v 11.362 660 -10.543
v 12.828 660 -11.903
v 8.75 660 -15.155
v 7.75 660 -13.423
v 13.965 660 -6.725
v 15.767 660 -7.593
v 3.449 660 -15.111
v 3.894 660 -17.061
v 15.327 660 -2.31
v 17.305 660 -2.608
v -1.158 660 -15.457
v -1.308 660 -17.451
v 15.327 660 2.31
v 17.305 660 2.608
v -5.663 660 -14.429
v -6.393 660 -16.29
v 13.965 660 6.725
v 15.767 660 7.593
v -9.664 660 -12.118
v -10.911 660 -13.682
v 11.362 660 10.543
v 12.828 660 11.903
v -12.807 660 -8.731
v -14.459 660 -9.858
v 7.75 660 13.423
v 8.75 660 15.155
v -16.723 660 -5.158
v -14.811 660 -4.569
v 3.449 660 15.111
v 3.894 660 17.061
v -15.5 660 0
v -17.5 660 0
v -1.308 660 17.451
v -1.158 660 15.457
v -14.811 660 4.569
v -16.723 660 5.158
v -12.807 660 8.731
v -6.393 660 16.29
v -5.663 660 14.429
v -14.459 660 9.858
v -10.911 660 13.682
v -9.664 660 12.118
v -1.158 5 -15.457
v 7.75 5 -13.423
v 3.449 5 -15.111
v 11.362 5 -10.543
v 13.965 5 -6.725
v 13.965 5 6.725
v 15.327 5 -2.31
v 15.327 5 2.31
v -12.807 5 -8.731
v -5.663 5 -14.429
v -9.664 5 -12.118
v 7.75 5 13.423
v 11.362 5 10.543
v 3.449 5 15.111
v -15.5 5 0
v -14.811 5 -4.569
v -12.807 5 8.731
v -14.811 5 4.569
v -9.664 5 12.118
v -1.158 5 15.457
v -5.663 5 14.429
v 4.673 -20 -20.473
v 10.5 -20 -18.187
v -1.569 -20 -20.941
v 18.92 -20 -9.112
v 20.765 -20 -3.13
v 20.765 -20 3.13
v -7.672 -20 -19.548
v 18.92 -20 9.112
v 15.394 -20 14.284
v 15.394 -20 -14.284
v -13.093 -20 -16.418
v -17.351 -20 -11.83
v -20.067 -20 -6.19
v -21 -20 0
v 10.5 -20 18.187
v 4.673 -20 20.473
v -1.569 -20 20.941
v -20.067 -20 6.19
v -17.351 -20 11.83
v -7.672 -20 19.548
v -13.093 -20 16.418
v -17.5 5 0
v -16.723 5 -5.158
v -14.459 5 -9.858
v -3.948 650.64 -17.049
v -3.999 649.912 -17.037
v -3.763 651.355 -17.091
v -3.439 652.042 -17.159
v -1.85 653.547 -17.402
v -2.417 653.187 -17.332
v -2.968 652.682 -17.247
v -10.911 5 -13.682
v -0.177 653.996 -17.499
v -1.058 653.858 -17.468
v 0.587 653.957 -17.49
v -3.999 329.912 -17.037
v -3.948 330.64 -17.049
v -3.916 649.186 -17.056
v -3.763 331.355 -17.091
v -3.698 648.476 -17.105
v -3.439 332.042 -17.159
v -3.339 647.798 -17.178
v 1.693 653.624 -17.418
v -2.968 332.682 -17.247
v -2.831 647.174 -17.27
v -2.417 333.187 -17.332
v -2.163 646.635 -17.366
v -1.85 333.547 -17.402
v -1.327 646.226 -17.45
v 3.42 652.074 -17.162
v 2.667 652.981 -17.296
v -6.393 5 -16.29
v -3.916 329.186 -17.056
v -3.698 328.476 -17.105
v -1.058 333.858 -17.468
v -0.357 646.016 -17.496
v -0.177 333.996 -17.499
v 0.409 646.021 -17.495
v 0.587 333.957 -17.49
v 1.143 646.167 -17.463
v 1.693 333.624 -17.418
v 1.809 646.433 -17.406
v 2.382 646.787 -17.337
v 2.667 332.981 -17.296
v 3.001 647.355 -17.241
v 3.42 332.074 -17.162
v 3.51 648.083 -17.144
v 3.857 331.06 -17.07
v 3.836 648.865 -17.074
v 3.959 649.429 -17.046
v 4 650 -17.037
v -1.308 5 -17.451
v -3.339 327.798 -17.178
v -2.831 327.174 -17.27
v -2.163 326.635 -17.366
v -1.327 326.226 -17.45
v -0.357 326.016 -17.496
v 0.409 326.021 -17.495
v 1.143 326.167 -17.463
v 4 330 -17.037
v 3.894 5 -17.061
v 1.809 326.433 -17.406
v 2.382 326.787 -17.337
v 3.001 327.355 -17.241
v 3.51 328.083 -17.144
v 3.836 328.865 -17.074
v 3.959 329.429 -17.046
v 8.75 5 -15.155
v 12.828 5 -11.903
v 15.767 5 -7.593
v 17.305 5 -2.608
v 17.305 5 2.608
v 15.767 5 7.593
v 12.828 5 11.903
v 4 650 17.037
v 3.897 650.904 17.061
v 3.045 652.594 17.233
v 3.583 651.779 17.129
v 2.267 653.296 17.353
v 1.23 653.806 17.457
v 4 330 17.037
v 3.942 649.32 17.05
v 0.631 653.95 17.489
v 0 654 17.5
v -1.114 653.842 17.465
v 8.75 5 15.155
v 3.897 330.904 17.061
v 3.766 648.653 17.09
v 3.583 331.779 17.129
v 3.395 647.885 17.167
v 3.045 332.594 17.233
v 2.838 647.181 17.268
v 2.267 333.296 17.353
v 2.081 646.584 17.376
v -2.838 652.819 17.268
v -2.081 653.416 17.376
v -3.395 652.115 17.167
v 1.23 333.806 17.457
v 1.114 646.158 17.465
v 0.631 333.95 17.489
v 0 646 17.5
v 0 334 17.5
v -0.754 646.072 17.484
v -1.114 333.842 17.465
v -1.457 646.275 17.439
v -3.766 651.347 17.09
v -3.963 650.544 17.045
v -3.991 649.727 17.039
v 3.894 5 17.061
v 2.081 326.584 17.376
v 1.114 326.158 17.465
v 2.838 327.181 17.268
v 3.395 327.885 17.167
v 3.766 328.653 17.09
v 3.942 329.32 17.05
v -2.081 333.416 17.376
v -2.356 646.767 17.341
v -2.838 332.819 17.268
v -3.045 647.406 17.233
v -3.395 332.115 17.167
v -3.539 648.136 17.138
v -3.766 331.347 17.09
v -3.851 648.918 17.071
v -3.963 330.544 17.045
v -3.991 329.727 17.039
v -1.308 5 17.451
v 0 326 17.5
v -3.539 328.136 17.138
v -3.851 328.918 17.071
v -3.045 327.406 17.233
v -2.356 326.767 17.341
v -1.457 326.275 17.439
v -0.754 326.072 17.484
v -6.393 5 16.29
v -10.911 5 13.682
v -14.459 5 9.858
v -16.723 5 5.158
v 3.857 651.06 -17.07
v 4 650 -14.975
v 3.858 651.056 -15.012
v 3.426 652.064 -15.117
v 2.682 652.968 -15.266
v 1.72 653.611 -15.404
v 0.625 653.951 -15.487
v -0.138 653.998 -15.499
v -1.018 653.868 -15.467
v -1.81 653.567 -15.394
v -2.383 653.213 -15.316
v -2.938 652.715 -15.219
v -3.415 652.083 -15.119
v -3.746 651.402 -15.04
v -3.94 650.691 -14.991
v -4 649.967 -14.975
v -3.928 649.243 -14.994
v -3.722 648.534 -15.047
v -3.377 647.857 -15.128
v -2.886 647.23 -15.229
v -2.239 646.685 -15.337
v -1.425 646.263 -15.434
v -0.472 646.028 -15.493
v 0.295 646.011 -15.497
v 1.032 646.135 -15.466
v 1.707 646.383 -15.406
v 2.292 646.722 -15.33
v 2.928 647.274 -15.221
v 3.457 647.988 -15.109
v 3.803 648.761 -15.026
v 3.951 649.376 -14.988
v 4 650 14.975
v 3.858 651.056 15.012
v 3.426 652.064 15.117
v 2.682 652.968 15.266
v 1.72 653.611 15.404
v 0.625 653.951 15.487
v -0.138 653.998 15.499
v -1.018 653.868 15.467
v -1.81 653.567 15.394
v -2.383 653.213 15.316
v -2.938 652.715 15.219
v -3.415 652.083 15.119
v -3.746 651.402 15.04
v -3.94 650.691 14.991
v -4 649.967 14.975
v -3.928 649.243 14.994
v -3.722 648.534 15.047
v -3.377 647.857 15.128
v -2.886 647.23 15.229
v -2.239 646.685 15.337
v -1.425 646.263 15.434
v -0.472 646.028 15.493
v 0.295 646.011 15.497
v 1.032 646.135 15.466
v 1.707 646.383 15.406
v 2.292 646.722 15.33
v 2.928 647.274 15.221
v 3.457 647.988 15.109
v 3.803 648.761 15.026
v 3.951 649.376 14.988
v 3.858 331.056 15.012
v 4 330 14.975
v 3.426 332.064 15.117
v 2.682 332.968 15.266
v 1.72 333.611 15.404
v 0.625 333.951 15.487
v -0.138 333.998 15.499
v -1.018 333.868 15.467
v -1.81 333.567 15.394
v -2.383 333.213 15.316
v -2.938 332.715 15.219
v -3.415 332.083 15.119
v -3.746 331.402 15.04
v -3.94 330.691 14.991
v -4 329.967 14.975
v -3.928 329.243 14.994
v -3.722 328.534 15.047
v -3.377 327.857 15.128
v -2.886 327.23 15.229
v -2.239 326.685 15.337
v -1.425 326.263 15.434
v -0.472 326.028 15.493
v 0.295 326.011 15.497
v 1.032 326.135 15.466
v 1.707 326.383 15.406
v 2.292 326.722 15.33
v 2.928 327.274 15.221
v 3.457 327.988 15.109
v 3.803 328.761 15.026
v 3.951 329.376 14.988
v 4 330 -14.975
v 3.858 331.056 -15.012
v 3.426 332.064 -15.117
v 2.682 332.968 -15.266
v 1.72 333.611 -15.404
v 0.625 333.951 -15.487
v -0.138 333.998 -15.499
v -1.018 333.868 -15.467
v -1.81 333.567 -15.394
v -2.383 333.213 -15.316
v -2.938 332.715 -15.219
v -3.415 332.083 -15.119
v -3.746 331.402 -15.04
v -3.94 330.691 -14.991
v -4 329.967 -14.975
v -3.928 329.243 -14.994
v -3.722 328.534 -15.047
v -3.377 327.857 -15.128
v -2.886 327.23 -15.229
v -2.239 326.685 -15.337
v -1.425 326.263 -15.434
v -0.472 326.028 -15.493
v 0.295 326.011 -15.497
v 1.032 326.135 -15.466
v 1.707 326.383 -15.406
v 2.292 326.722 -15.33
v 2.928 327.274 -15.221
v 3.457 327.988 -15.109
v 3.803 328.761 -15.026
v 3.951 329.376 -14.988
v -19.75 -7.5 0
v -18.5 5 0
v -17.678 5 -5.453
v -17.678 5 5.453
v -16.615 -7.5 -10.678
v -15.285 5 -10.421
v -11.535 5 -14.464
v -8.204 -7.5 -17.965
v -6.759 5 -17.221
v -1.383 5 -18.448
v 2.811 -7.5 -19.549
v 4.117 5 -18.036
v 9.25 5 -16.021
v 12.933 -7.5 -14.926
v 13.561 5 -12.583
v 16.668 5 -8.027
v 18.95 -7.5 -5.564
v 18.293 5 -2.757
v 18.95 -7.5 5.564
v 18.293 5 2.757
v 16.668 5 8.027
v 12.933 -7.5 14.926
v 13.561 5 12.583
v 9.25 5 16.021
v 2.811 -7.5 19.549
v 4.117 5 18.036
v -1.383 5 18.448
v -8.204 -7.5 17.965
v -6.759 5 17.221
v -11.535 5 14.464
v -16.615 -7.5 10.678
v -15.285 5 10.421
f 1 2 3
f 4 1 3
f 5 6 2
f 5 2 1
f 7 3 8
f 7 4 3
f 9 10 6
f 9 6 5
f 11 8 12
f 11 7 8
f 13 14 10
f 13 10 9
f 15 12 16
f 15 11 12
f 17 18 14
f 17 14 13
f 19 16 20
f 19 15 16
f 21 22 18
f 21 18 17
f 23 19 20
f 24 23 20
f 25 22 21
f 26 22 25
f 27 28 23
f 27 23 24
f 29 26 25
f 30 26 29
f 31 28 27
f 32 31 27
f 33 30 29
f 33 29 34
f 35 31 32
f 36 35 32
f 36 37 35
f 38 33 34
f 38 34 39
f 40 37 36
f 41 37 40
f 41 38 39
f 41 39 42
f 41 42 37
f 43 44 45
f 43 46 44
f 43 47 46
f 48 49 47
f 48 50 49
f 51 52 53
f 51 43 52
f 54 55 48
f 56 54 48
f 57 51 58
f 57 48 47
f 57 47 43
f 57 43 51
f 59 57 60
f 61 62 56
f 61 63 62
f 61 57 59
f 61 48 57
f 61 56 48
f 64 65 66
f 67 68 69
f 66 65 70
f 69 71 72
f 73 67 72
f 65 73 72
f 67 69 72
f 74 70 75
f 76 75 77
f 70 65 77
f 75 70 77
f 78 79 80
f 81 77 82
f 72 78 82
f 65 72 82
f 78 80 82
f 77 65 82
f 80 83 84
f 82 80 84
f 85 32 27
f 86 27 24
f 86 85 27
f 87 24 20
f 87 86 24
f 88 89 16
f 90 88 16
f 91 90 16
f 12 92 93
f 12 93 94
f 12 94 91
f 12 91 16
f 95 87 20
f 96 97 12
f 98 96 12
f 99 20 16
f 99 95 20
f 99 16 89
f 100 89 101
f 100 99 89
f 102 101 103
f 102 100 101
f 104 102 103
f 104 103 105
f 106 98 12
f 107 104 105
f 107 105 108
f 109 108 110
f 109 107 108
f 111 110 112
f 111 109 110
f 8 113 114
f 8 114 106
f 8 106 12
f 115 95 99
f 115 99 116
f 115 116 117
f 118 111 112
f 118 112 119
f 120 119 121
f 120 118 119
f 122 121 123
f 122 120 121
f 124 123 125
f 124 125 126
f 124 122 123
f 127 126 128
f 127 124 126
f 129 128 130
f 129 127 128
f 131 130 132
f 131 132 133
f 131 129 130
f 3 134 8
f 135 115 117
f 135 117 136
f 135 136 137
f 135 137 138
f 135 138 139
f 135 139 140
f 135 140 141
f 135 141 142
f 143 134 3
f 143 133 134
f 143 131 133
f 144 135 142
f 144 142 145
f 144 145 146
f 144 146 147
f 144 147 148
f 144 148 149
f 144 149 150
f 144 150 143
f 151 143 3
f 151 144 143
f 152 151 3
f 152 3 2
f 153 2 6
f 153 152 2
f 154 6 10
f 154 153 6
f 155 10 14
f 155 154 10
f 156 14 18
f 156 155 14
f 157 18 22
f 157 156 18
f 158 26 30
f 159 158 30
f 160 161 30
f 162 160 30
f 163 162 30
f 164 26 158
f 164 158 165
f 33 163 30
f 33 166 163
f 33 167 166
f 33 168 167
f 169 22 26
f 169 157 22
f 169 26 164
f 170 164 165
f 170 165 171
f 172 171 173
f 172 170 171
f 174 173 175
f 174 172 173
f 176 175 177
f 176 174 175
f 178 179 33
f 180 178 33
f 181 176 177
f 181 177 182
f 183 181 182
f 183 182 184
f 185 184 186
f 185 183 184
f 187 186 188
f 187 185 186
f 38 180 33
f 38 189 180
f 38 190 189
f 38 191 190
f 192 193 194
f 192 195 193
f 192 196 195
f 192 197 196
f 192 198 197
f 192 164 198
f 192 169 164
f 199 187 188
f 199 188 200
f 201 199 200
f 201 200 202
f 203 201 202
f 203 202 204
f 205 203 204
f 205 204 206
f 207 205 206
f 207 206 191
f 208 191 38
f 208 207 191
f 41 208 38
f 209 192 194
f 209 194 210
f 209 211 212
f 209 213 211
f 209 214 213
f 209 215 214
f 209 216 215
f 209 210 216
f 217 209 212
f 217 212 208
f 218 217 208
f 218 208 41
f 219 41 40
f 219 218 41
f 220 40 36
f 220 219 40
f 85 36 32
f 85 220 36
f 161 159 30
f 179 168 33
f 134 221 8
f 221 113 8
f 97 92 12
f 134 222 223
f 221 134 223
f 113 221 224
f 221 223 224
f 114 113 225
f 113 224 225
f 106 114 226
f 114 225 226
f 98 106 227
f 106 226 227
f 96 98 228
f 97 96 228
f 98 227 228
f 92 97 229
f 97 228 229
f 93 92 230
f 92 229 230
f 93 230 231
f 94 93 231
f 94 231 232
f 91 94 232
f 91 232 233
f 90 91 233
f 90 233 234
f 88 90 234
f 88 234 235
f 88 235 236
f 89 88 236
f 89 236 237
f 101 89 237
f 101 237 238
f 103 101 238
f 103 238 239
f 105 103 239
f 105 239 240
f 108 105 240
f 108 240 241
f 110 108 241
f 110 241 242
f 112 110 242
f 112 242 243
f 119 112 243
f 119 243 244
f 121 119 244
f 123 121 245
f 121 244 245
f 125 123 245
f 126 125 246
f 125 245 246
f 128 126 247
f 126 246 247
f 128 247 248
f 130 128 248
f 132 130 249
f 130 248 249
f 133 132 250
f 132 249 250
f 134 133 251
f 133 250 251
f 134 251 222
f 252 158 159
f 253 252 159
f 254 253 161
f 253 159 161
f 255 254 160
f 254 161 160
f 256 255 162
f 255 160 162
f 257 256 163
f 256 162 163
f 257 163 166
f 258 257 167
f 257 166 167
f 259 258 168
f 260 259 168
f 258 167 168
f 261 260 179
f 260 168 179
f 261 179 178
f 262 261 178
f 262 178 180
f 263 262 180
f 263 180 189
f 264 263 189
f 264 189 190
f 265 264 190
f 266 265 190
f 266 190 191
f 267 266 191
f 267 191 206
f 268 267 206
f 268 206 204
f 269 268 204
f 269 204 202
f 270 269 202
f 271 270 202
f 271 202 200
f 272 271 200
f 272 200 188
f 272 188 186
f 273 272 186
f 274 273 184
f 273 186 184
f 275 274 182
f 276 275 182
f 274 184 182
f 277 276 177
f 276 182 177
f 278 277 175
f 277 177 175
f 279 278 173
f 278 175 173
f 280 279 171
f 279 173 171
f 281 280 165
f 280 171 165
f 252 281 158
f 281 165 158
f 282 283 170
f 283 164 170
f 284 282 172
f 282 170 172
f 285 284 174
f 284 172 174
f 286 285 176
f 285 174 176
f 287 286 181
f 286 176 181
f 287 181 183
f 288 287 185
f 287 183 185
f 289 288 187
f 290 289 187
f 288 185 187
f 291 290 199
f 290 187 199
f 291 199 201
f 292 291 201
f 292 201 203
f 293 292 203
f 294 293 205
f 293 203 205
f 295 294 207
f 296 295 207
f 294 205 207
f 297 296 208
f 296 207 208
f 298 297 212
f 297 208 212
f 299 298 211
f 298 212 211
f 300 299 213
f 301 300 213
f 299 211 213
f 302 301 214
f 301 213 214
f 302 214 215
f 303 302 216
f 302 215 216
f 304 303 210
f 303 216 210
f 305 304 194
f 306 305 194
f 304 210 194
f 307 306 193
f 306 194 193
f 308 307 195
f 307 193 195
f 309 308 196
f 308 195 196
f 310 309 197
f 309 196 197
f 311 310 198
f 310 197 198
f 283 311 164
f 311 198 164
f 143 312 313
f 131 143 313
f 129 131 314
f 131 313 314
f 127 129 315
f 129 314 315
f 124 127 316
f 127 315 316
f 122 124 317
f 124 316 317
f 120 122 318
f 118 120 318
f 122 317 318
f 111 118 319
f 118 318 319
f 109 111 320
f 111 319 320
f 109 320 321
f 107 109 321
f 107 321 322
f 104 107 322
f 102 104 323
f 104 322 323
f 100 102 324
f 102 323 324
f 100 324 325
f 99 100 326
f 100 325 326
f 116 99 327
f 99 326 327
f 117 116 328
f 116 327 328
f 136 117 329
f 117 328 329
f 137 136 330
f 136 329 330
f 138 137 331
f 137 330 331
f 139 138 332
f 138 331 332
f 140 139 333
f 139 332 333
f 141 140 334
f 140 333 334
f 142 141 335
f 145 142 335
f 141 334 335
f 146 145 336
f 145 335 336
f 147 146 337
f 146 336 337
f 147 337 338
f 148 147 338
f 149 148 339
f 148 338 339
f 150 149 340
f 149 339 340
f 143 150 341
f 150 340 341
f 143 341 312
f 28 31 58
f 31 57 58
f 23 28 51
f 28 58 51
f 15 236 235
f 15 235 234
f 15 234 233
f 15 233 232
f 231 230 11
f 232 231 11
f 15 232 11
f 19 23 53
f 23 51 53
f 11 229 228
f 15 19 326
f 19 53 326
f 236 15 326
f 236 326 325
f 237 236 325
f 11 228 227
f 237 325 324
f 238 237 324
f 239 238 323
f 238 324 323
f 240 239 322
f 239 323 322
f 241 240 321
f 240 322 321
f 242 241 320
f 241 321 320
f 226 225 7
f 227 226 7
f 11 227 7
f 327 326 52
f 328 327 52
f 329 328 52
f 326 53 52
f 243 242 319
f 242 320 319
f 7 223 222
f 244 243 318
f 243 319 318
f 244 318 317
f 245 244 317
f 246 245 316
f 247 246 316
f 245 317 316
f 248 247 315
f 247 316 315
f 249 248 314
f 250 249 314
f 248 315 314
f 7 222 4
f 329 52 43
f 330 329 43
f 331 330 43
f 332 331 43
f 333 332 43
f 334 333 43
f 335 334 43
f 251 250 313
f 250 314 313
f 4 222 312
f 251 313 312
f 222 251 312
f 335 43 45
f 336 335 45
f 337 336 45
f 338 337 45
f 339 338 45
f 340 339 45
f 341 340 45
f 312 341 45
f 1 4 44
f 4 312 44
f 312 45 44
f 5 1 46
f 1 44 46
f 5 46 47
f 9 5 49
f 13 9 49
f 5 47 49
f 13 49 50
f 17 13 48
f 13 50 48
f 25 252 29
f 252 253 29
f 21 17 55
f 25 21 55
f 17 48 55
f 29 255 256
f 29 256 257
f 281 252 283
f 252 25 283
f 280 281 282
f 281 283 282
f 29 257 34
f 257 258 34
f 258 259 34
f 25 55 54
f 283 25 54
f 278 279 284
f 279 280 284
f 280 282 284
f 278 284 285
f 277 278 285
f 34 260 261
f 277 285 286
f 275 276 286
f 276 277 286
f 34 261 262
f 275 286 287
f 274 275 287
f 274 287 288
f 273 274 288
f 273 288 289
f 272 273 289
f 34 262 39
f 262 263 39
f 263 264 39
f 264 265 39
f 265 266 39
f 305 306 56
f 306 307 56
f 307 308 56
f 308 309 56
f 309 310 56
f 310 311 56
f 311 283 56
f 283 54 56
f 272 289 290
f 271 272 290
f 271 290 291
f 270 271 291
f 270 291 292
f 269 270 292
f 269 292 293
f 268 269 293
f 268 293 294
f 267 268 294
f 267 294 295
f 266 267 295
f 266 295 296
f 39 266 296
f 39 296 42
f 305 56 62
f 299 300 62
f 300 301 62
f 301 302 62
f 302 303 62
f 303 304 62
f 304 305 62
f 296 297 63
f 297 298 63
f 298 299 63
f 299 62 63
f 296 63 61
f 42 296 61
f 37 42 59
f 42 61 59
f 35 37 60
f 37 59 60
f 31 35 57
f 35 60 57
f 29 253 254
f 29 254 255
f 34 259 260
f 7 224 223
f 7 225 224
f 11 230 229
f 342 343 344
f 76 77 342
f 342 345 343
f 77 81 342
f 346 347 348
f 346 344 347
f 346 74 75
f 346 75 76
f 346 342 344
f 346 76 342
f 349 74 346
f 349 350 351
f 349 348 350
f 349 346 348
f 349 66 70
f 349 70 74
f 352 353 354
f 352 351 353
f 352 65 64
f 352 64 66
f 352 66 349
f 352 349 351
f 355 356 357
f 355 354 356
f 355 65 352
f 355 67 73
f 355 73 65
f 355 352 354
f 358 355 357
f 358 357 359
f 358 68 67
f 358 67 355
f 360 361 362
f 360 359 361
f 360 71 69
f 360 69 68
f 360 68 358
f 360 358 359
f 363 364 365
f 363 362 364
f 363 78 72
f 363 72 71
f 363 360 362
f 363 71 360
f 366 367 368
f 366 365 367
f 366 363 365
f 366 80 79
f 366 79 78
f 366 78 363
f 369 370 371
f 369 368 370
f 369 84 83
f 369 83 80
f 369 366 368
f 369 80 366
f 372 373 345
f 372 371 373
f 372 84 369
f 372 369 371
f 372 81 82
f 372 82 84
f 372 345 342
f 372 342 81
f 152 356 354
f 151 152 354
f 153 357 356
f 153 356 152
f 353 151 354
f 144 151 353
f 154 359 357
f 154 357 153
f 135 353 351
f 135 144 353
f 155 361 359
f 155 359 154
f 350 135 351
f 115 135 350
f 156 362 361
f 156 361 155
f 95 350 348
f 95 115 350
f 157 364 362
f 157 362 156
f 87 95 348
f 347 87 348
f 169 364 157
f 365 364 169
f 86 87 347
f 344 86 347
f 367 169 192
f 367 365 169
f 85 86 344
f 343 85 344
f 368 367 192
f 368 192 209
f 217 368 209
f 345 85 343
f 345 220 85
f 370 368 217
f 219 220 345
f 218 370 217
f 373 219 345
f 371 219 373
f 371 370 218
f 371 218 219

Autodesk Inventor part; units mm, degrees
ref_plane "YZ Plane" through (0, 0, 0) normal (1, 0, 0) x (0, 1, 0)
sketch "Boceto1" plane through (0, 0, 0) normal (0, 1, 0) x (-1, 0, 0)
  circle A0 centre (0, 0) radius 17.5
  dimension "d0" = 35
extrude "Extrusión1" add sketch "Boceto1" along normal blind 660
shell "Vaciado1" thickness 2 removed faces 2 at (-4.865, 0, -5.1831) at (-4.865, 660, -5.1831)
ref_plane "Plano de trabajo1" through (0, 0, 17.5) normal (0, 0, 1) x (1, 0, 0)
sketch "Boceto2" plane through (0, 0, 17.5) normal (0, 0, 1) x (1, 0, 0)
  line L0 (0, 714.392) -> (0, -104.9263) construction
  line L1 (-367.8002, 0) -> (437.007, 0) construction
  circle A0 centre (0, 650) radius 4
  line L2 (17.5, 660) -> (-17.5, 660) projected
  circle A1 centre (0, 330) radius 4
  point P0 (0, 0)
  dimension "d5" = 8
  dimension "d6" = 10
  dimension "d7" = 8
  dimension "d8" = 330
extrude "Extrusión2" cut sketch "Boceto2" against normal blind 50
ref_plane "Plano de trabajo2" through (0, 5, 0) normal (0, 1, 0) x (-1, 0, 0)
sketch "Boceto3" plane through (0, 5, 0) normal (0, 1, 0) x (-1, 0, 0)
  circle A0 centre (0, 0) radius 18.5
  dimension "d12" = 37
ref_plane "Plano de trabajo3" through (0, -20, 0) normal (0, 1, 0) x (-1, 0, 0)
sketch "Boceto4" plane through (0, -20, 0) normal (0, 1, 0) x (-1, 0, 0)
  circle A0 centre (0, 0) radius 21
  dimension "d14" = 42
loft "Solevación1" add profiles "Boceto4", "Boceto3"
